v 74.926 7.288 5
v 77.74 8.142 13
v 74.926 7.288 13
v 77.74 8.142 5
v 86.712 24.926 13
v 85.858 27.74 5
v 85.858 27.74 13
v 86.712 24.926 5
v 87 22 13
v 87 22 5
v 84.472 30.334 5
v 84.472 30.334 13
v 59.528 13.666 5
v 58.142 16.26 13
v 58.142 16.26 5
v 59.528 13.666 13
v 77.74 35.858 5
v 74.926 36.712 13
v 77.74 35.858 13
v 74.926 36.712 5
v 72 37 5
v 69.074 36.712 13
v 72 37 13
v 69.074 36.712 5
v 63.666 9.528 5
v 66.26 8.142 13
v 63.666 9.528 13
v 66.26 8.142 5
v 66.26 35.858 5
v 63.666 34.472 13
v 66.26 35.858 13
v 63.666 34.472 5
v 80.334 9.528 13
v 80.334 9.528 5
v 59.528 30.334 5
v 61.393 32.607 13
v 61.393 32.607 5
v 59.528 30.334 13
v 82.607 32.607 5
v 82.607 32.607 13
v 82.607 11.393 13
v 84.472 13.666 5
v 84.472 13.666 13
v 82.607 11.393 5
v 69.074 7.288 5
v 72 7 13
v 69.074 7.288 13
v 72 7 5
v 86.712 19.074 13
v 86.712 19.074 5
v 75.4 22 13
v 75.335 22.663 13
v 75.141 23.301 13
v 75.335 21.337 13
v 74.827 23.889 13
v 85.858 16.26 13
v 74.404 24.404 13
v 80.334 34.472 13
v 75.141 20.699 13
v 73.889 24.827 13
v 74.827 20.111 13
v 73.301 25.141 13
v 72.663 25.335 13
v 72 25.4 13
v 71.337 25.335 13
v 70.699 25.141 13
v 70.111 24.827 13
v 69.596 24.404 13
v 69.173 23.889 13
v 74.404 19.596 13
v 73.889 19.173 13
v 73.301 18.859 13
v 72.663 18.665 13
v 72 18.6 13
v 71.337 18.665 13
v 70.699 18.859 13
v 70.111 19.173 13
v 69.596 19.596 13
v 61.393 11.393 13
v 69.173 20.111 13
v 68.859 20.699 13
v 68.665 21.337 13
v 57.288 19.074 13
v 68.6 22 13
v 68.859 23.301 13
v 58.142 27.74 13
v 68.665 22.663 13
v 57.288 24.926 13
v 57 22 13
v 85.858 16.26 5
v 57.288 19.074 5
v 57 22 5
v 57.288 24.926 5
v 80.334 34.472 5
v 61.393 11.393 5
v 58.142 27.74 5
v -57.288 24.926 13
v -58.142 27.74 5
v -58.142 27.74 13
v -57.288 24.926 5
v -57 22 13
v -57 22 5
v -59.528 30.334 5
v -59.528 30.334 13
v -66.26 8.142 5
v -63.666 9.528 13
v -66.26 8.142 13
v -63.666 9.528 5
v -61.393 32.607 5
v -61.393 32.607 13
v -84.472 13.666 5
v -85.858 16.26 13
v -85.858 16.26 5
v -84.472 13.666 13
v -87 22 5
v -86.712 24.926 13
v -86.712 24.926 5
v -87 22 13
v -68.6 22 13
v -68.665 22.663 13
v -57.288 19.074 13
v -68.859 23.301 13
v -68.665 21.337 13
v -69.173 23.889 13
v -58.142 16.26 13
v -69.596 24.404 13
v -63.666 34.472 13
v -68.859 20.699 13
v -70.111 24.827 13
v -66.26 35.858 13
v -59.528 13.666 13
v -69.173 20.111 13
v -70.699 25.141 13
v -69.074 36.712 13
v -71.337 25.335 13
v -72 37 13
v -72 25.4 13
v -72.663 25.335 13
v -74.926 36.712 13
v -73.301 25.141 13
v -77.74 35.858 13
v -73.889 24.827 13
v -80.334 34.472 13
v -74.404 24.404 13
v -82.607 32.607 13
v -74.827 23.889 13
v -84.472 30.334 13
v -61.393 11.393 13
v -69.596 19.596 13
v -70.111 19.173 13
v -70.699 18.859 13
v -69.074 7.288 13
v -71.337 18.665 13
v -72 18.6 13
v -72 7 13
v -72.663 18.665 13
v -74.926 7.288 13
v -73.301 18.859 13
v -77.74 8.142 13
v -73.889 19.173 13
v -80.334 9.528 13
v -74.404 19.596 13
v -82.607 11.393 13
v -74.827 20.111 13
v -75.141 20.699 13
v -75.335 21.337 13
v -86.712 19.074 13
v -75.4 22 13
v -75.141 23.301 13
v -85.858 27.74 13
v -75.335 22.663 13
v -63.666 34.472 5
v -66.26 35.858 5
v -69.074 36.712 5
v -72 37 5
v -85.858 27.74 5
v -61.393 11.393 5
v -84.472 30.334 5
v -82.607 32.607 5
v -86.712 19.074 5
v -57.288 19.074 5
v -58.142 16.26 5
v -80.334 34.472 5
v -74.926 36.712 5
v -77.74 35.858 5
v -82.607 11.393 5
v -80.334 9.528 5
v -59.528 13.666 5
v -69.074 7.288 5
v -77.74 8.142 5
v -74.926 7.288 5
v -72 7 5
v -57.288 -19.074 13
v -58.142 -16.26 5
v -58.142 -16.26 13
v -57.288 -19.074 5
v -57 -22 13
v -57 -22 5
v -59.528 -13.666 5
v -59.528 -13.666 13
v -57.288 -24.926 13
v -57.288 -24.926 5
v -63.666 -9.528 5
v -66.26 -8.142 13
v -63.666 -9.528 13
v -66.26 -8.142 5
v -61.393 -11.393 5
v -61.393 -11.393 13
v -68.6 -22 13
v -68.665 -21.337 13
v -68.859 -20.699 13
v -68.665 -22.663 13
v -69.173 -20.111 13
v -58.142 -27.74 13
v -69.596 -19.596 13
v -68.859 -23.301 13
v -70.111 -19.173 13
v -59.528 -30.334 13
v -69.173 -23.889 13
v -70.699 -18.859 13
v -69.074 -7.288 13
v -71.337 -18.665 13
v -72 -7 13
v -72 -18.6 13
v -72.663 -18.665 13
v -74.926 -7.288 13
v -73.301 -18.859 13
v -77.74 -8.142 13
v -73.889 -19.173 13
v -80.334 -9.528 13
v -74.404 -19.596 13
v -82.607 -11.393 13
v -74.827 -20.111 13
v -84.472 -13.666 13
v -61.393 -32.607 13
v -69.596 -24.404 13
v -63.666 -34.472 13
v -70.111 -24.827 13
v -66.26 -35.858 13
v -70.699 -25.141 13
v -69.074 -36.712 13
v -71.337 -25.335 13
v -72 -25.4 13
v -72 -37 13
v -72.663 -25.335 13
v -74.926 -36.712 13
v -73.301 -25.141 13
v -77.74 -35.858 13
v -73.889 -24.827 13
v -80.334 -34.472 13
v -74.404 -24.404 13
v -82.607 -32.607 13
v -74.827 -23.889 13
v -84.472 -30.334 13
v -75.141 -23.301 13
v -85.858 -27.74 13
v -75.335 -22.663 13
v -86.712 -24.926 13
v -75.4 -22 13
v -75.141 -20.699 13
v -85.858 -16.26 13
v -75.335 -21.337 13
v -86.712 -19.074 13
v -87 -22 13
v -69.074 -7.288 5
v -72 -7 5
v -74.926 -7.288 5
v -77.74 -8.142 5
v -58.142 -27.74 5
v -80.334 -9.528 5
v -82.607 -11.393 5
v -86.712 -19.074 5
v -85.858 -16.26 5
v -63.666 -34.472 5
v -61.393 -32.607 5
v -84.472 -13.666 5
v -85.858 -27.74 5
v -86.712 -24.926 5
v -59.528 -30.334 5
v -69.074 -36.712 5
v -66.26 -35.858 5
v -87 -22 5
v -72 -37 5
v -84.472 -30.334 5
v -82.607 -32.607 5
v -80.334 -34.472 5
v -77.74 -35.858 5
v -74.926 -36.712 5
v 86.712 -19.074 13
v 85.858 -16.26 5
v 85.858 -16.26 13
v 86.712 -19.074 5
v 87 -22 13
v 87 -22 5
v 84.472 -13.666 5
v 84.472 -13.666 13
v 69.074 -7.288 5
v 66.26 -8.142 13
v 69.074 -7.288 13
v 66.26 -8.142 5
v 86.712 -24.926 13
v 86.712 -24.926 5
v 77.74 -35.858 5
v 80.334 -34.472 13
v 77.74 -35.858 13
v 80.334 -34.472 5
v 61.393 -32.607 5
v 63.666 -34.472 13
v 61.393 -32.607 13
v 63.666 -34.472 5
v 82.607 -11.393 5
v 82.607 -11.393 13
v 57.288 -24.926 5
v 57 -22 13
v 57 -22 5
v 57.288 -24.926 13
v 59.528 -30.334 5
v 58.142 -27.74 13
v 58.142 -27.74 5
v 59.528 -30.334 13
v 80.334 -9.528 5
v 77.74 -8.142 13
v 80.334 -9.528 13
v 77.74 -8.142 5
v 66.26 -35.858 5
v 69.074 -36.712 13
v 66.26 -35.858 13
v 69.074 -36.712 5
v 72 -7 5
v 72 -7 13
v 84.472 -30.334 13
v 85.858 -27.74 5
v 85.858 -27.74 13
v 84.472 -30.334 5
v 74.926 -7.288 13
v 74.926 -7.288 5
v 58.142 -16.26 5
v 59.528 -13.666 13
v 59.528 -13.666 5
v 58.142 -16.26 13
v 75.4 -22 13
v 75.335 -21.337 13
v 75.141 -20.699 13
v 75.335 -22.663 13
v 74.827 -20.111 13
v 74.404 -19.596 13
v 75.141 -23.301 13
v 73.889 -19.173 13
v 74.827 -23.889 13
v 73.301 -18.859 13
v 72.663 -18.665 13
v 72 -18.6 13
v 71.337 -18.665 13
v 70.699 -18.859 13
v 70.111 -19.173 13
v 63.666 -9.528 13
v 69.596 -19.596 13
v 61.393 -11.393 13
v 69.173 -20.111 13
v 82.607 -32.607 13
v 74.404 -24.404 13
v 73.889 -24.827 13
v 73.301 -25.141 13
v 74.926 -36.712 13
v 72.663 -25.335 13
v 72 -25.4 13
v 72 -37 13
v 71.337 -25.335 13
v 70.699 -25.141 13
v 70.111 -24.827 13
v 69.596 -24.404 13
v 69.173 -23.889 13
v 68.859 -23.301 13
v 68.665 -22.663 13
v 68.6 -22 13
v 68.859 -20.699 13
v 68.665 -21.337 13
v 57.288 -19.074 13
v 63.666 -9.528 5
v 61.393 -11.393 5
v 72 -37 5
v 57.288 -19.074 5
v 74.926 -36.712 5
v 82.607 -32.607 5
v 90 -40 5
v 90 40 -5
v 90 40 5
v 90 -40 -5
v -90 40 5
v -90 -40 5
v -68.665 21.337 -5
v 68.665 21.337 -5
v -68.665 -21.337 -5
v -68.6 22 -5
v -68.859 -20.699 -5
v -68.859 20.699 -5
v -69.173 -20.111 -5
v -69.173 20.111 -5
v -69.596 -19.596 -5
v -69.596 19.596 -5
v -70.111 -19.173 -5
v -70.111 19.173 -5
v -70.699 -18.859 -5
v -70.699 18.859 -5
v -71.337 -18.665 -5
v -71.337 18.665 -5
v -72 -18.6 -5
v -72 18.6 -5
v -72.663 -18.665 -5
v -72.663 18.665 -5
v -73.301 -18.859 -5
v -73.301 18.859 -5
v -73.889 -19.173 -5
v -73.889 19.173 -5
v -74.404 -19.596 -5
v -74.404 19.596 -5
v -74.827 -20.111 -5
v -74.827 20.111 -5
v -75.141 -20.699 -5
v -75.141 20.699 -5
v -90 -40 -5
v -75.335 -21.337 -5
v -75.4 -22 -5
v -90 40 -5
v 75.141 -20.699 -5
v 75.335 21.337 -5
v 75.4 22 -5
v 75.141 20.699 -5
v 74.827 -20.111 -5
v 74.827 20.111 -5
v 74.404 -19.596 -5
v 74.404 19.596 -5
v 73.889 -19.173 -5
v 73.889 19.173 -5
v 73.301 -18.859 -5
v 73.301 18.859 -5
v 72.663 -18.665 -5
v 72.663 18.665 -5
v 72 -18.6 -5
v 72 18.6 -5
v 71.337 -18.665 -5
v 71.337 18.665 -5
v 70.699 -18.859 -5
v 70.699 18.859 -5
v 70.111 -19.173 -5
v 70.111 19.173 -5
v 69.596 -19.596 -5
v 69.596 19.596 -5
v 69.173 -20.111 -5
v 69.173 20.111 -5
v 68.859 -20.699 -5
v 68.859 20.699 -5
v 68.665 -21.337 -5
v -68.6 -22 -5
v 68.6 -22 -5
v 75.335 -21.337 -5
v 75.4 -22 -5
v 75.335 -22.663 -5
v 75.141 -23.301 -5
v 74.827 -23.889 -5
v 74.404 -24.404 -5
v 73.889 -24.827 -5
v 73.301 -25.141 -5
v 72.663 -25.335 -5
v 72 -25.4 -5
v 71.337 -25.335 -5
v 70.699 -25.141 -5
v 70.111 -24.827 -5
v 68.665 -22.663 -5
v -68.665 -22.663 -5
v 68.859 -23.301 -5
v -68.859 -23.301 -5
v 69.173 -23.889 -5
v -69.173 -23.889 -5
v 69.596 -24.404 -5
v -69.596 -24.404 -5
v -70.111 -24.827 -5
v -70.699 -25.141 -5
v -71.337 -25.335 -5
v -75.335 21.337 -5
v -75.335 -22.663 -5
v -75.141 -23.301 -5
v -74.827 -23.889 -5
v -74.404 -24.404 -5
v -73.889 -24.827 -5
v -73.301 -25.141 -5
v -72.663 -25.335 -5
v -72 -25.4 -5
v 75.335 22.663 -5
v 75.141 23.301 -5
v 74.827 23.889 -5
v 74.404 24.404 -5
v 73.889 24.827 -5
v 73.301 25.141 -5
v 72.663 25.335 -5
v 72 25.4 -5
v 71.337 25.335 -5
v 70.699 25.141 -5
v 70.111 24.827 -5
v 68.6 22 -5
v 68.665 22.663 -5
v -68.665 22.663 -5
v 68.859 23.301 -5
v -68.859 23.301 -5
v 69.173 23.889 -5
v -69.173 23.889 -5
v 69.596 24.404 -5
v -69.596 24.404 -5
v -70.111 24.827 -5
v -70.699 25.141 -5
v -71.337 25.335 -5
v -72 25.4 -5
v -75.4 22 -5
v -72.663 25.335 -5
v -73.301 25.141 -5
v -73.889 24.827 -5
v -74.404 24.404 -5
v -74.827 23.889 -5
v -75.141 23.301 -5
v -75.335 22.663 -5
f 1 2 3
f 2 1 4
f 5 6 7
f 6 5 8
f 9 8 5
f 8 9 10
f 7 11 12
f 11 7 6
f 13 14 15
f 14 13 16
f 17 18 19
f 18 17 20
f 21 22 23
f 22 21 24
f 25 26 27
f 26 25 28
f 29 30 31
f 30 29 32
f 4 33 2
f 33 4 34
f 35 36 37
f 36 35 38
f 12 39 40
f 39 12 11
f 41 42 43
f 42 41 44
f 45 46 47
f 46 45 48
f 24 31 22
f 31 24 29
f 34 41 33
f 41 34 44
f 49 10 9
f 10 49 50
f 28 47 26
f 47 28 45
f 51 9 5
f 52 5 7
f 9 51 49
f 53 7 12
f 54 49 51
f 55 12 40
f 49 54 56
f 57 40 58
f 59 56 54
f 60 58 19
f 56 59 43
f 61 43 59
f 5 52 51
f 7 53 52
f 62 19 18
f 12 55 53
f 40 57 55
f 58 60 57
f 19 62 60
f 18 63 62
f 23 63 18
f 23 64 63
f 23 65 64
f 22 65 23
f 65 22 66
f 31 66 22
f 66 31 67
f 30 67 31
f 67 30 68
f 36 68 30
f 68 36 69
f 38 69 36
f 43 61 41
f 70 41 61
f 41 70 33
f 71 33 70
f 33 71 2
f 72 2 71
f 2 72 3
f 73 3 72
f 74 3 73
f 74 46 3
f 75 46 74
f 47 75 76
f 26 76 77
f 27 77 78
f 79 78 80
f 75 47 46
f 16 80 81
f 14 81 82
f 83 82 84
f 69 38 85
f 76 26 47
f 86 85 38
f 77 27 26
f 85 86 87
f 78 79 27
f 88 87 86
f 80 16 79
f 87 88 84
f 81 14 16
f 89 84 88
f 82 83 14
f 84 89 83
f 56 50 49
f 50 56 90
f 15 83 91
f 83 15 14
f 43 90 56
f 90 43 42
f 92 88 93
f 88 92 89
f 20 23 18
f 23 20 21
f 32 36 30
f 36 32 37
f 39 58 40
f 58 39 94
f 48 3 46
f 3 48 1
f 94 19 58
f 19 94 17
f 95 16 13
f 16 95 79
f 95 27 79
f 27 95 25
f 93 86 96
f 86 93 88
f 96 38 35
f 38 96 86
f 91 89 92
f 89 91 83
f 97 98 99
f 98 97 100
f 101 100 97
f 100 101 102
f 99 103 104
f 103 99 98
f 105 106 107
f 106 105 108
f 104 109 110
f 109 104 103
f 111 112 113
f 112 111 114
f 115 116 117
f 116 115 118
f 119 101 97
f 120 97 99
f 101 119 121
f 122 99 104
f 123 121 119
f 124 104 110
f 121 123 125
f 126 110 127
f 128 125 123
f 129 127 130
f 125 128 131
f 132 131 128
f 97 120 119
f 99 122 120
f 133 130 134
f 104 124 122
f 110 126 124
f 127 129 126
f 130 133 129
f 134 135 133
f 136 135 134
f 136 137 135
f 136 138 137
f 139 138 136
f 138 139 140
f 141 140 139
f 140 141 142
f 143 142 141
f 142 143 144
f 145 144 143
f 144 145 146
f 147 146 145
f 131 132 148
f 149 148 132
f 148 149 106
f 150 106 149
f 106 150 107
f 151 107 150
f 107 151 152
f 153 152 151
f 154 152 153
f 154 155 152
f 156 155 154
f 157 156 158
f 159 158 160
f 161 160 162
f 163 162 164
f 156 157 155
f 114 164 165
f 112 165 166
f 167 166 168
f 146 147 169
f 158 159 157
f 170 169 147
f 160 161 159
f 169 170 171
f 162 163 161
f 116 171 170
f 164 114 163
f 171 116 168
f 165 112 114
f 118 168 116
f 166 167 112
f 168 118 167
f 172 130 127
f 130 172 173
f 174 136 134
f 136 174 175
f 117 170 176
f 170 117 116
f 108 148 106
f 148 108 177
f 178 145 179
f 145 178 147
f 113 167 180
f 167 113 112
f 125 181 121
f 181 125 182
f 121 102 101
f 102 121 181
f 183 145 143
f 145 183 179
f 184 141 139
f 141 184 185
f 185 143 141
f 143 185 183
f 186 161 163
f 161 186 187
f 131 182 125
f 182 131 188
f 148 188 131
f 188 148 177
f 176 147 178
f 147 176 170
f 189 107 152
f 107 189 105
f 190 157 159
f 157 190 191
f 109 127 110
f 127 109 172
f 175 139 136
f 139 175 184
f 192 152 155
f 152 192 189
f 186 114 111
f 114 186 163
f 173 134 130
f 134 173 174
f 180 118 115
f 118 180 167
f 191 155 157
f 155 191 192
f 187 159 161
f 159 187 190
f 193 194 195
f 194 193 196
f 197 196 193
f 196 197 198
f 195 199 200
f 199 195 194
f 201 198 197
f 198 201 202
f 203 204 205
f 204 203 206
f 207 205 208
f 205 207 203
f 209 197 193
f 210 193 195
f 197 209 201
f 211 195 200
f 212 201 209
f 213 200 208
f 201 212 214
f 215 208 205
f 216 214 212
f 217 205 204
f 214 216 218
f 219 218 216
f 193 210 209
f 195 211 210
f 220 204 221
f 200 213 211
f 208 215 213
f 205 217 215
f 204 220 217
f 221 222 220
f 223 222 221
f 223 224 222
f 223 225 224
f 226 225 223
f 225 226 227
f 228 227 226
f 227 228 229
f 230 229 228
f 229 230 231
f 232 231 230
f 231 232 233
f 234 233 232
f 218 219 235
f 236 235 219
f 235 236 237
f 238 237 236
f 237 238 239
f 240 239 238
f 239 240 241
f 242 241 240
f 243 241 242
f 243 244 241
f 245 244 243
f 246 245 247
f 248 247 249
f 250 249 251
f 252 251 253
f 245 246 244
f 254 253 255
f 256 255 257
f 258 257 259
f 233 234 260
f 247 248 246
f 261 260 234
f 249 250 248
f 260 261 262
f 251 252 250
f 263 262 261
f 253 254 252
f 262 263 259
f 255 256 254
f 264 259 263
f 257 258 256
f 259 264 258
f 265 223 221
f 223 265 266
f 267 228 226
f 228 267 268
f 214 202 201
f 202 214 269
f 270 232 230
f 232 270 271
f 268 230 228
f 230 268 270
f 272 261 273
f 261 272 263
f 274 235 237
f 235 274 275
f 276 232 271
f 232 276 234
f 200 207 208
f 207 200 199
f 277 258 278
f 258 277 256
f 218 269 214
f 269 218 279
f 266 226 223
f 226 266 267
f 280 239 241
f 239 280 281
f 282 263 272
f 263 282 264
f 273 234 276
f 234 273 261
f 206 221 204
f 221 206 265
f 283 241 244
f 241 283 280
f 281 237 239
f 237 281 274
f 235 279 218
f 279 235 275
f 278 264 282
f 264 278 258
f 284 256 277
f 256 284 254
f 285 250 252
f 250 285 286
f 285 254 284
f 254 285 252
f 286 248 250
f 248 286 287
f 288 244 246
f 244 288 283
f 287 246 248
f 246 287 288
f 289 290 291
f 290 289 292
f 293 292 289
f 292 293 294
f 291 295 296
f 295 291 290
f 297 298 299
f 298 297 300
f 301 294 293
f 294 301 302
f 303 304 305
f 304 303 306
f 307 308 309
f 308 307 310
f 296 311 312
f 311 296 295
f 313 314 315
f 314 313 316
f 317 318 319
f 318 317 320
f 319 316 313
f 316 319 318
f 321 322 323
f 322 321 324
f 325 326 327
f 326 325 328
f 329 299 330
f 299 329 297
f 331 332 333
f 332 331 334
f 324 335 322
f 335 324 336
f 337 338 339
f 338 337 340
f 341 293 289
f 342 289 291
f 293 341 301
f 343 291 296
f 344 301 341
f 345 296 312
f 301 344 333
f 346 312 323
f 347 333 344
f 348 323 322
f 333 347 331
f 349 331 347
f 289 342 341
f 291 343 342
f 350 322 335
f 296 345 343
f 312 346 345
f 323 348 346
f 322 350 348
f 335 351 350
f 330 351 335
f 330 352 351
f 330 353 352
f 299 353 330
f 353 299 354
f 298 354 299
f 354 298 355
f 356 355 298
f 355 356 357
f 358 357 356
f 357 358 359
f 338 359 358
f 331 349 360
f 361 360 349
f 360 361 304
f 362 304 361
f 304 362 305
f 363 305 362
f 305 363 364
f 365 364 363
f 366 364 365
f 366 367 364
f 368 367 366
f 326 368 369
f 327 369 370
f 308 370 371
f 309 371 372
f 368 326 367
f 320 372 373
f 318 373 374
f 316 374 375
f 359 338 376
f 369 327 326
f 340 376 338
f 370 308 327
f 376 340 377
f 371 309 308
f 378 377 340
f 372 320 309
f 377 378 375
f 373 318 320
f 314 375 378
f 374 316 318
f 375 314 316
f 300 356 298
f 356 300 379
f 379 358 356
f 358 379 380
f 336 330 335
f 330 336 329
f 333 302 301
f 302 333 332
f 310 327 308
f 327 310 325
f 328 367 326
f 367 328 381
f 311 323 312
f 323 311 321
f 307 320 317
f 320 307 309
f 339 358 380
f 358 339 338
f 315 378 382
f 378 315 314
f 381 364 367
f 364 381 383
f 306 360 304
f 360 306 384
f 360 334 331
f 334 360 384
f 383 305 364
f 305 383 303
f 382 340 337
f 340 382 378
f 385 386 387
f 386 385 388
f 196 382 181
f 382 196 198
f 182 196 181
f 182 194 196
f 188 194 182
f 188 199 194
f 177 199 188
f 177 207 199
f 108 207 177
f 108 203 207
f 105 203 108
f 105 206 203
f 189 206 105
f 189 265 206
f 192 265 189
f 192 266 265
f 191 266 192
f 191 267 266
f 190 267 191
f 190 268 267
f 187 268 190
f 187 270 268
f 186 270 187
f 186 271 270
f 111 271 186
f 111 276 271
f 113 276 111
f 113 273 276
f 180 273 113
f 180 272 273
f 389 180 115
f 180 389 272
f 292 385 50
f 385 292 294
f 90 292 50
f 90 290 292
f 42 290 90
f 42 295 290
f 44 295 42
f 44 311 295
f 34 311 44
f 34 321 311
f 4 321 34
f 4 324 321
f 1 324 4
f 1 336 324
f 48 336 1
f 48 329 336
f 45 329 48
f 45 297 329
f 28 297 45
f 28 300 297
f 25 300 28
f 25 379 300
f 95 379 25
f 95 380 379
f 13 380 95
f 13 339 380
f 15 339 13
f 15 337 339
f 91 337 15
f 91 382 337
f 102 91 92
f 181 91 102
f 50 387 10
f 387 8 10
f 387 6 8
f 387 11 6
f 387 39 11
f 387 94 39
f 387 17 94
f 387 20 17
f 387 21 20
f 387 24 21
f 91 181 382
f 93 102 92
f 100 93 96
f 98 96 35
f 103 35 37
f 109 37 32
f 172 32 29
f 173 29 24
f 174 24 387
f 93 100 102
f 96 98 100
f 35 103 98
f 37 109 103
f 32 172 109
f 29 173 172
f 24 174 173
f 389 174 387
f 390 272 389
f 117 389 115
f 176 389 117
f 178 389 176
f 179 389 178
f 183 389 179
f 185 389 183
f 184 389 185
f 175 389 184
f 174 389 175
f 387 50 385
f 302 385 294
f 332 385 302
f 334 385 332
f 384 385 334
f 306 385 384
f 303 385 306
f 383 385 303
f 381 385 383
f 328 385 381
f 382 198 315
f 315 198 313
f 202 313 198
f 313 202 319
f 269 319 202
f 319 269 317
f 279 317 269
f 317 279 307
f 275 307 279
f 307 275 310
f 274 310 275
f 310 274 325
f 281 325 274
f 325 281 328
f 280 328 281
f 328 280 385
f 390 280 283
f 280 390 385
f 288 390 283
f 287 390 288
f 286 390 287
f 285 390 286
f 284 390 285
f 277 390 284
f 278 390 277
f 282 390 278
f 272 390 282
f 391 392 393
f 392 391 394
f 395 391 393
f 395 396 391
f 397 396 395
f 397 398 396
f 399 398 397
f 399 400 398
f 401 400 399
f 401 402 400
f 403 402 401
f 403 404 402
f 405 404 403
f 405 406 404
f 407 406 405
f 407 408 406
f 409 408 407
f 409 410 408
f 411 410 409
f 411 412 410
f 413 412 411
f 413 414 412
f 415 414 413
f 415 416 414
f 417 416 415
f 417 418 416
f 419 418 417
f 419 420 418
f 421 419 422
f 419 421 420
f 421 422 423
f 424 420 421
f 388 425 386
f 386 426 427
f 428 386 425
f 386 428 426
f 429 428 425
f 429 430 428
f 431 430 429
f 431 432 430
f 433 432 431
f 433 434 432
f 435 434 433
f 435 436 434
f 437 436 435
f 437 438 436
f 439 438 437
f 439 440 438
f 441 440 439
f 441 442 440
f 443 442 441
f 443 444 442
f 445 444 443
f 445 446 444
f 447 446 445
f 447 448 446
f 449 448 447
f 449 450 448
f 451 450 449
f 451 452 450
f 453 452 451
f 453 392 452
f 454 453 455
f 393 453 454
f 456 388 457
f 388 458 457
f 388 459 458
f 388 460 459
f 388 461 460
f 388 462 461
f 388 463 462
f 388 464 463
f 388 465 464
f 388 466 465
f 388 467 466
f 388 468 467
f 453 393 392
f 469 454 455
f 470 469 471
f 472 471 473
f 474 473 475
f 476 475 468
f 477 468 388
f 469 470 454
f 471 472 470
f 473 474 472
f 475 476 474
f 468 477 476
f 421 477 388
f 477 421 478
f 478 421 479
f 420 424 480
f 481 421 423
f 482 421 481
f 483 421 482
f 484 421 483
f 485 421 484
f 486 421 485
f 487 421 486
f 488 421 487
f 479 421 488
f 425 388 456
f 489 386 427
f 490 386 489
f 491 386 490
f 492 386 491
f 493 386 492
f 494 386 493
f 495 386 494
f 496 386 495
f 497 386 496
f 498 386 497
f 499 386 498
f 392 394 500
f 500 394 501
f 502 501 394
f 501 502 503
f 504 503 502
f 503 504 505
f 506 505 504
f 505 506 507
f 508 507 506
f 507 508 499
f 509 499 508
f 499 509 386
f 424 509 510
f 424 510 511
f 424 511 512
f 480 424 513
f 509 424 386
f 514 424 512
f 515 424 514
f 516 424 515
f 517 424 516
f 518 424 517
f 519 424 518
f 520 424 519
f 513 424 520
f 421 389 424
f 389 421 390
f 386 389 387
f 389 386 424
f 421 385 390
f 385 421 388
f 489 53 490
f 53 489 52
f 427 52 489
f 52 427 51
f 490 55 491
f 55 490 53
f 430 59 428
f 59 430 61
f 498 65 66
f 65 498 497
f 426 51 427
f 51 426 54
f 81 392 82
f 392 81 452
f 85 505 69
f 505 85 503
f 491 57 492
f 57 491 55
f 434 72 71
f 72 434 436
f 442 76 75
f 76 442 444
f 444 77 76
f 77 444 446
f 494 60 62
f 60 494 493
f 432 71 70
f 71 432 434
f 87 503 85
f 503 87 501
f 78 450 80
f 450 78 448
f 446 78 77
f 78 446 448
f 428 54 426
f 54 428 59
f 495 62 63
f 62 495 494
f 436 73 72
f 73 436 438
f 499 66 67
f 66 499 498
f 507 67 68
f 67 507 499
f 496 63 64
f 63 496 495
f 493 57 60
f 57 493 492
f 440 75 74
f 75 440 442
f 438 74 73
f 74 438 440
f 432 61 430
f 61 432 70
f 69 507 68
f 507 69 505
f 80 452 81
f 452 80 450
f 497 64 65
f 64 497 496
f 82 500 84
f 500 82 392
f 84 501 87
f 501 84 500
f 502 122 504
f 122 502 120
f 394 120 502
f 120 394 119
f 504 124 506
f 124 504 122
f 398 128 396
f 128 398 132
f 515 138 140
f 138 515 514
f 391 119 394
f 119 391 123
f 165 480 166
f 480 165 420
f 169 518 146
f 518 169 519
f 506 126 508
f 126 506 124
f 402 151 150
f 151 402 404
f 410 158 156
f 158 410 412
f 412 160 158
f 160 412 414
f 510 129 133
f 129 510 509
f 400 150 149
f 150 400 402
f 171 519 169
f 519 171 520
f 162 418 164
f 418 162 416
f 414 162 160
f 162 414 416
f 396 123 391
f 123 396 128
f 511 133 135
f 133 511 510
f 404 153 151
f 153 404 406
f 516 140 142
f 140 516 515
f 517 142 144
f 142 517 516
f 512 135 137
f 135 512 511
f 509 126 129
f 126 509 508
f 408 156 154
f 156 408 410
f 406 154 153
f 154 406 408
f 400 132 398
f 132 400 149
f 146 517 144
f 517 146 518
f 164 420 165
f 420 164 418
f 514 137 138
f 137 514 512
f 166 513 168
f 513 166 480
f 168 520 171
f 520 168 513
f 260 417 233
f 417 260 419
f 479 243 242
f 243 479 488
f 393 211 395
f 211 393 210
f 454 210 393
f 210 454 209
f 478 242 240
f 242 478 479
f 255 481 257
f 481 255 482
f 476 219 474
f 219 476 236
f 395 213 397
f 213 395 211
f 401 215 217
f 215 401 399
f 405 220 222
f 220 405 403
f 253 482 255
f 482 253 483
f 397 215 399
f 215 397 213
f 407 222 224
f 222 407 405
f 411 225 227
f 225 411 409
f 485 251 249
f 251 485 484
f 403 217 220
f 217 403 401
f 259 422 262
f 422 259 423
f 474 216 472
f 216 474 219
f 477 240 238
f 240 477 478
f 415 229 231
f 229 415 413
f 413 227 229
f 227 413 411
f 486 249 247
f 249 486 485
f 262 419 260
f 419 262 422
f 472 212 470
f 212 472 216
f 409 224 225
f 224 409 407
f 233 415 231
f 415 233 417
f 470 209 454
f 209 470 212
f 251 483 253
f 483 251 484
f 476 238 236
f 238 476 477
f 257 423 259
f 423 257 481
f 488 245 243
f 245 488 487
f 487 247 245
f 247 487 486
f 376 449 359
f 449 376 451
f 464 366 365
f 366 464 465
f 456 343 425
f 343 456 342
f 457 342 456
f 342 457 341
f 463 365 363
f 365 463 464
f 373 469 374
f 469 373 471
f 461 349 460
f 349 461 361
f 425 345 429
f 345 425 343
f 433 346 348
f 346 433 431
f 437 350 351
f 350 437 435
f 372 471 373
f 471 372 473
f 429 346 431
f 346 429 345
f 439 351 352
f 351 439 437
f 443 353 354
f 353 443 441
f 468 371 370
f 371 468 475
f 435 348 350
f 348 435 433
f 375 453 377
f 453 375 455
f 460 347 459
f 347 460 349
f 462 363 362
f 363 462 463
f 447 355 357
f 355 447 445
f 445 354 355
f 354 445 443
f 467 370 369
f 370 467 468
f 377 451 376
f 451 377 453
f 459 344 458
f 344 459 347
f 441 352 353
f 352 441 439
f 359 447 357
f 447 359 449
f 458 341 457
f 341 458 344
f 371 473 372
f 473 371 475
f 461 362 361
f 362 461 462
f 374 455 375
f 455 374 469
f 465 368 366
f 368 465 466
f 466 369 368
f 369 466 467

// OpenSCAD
$fn = 32;
// ----------------------------------------------------------------------
// Anchor pads 180 x 80 x 18
// four corner bosses with anchor holes
// ----------------------------------------------------------------------

// --- parameters (mm) ---
plate = [180, 80, 10];  // base plate size (x, y, z)
pads = 4;               // boss count, one per corner
edge = 18;              // boss centre offset from the plate edge
boss_d = 30;            // boss diameter
boss_h = 8;             // boss height above the base plate
bore_d = 6.6;           // nominal hole diameter from the drawing
print_allowance = 0.2;  // clearance added for printing

// --- derived feature positions (mm) ---
hole_d = bore_d + print_allowance;  // = 6.8   hole diameter as printed
height = plate[2] + boss_h;         // = 18   overall height of the part
corner_x = plate[0] / 2 - edge;     // = 72   boss centre X
corner_y = plate[1] / 2 - edge;     // = 22   boss centre Y
feature_centers = [
  [corner_x, corner_y],
  [-corner_x, corner_y],
  [-corner_x, -corner_y],
  [corner_x, -corner_y]
];   // boss centres, anchor holes are drilled there

// base plate, four bosses standing on it, anchor holes all the way through
difference() {
  union() {
    cube(plate, center = true);
    for (centre = feature_centers)
      translate([centre[0], centre[1], plate[2] / 2 - 1])
        cylinder(d = boss_d, h = boss_h + 1);
  }
  for (centre = feature_centers)
    translate([centre[0], centre[1], -height])
      cylinder(d = hole_d, h = 2 * height + 2);  // through boss and plate
}
